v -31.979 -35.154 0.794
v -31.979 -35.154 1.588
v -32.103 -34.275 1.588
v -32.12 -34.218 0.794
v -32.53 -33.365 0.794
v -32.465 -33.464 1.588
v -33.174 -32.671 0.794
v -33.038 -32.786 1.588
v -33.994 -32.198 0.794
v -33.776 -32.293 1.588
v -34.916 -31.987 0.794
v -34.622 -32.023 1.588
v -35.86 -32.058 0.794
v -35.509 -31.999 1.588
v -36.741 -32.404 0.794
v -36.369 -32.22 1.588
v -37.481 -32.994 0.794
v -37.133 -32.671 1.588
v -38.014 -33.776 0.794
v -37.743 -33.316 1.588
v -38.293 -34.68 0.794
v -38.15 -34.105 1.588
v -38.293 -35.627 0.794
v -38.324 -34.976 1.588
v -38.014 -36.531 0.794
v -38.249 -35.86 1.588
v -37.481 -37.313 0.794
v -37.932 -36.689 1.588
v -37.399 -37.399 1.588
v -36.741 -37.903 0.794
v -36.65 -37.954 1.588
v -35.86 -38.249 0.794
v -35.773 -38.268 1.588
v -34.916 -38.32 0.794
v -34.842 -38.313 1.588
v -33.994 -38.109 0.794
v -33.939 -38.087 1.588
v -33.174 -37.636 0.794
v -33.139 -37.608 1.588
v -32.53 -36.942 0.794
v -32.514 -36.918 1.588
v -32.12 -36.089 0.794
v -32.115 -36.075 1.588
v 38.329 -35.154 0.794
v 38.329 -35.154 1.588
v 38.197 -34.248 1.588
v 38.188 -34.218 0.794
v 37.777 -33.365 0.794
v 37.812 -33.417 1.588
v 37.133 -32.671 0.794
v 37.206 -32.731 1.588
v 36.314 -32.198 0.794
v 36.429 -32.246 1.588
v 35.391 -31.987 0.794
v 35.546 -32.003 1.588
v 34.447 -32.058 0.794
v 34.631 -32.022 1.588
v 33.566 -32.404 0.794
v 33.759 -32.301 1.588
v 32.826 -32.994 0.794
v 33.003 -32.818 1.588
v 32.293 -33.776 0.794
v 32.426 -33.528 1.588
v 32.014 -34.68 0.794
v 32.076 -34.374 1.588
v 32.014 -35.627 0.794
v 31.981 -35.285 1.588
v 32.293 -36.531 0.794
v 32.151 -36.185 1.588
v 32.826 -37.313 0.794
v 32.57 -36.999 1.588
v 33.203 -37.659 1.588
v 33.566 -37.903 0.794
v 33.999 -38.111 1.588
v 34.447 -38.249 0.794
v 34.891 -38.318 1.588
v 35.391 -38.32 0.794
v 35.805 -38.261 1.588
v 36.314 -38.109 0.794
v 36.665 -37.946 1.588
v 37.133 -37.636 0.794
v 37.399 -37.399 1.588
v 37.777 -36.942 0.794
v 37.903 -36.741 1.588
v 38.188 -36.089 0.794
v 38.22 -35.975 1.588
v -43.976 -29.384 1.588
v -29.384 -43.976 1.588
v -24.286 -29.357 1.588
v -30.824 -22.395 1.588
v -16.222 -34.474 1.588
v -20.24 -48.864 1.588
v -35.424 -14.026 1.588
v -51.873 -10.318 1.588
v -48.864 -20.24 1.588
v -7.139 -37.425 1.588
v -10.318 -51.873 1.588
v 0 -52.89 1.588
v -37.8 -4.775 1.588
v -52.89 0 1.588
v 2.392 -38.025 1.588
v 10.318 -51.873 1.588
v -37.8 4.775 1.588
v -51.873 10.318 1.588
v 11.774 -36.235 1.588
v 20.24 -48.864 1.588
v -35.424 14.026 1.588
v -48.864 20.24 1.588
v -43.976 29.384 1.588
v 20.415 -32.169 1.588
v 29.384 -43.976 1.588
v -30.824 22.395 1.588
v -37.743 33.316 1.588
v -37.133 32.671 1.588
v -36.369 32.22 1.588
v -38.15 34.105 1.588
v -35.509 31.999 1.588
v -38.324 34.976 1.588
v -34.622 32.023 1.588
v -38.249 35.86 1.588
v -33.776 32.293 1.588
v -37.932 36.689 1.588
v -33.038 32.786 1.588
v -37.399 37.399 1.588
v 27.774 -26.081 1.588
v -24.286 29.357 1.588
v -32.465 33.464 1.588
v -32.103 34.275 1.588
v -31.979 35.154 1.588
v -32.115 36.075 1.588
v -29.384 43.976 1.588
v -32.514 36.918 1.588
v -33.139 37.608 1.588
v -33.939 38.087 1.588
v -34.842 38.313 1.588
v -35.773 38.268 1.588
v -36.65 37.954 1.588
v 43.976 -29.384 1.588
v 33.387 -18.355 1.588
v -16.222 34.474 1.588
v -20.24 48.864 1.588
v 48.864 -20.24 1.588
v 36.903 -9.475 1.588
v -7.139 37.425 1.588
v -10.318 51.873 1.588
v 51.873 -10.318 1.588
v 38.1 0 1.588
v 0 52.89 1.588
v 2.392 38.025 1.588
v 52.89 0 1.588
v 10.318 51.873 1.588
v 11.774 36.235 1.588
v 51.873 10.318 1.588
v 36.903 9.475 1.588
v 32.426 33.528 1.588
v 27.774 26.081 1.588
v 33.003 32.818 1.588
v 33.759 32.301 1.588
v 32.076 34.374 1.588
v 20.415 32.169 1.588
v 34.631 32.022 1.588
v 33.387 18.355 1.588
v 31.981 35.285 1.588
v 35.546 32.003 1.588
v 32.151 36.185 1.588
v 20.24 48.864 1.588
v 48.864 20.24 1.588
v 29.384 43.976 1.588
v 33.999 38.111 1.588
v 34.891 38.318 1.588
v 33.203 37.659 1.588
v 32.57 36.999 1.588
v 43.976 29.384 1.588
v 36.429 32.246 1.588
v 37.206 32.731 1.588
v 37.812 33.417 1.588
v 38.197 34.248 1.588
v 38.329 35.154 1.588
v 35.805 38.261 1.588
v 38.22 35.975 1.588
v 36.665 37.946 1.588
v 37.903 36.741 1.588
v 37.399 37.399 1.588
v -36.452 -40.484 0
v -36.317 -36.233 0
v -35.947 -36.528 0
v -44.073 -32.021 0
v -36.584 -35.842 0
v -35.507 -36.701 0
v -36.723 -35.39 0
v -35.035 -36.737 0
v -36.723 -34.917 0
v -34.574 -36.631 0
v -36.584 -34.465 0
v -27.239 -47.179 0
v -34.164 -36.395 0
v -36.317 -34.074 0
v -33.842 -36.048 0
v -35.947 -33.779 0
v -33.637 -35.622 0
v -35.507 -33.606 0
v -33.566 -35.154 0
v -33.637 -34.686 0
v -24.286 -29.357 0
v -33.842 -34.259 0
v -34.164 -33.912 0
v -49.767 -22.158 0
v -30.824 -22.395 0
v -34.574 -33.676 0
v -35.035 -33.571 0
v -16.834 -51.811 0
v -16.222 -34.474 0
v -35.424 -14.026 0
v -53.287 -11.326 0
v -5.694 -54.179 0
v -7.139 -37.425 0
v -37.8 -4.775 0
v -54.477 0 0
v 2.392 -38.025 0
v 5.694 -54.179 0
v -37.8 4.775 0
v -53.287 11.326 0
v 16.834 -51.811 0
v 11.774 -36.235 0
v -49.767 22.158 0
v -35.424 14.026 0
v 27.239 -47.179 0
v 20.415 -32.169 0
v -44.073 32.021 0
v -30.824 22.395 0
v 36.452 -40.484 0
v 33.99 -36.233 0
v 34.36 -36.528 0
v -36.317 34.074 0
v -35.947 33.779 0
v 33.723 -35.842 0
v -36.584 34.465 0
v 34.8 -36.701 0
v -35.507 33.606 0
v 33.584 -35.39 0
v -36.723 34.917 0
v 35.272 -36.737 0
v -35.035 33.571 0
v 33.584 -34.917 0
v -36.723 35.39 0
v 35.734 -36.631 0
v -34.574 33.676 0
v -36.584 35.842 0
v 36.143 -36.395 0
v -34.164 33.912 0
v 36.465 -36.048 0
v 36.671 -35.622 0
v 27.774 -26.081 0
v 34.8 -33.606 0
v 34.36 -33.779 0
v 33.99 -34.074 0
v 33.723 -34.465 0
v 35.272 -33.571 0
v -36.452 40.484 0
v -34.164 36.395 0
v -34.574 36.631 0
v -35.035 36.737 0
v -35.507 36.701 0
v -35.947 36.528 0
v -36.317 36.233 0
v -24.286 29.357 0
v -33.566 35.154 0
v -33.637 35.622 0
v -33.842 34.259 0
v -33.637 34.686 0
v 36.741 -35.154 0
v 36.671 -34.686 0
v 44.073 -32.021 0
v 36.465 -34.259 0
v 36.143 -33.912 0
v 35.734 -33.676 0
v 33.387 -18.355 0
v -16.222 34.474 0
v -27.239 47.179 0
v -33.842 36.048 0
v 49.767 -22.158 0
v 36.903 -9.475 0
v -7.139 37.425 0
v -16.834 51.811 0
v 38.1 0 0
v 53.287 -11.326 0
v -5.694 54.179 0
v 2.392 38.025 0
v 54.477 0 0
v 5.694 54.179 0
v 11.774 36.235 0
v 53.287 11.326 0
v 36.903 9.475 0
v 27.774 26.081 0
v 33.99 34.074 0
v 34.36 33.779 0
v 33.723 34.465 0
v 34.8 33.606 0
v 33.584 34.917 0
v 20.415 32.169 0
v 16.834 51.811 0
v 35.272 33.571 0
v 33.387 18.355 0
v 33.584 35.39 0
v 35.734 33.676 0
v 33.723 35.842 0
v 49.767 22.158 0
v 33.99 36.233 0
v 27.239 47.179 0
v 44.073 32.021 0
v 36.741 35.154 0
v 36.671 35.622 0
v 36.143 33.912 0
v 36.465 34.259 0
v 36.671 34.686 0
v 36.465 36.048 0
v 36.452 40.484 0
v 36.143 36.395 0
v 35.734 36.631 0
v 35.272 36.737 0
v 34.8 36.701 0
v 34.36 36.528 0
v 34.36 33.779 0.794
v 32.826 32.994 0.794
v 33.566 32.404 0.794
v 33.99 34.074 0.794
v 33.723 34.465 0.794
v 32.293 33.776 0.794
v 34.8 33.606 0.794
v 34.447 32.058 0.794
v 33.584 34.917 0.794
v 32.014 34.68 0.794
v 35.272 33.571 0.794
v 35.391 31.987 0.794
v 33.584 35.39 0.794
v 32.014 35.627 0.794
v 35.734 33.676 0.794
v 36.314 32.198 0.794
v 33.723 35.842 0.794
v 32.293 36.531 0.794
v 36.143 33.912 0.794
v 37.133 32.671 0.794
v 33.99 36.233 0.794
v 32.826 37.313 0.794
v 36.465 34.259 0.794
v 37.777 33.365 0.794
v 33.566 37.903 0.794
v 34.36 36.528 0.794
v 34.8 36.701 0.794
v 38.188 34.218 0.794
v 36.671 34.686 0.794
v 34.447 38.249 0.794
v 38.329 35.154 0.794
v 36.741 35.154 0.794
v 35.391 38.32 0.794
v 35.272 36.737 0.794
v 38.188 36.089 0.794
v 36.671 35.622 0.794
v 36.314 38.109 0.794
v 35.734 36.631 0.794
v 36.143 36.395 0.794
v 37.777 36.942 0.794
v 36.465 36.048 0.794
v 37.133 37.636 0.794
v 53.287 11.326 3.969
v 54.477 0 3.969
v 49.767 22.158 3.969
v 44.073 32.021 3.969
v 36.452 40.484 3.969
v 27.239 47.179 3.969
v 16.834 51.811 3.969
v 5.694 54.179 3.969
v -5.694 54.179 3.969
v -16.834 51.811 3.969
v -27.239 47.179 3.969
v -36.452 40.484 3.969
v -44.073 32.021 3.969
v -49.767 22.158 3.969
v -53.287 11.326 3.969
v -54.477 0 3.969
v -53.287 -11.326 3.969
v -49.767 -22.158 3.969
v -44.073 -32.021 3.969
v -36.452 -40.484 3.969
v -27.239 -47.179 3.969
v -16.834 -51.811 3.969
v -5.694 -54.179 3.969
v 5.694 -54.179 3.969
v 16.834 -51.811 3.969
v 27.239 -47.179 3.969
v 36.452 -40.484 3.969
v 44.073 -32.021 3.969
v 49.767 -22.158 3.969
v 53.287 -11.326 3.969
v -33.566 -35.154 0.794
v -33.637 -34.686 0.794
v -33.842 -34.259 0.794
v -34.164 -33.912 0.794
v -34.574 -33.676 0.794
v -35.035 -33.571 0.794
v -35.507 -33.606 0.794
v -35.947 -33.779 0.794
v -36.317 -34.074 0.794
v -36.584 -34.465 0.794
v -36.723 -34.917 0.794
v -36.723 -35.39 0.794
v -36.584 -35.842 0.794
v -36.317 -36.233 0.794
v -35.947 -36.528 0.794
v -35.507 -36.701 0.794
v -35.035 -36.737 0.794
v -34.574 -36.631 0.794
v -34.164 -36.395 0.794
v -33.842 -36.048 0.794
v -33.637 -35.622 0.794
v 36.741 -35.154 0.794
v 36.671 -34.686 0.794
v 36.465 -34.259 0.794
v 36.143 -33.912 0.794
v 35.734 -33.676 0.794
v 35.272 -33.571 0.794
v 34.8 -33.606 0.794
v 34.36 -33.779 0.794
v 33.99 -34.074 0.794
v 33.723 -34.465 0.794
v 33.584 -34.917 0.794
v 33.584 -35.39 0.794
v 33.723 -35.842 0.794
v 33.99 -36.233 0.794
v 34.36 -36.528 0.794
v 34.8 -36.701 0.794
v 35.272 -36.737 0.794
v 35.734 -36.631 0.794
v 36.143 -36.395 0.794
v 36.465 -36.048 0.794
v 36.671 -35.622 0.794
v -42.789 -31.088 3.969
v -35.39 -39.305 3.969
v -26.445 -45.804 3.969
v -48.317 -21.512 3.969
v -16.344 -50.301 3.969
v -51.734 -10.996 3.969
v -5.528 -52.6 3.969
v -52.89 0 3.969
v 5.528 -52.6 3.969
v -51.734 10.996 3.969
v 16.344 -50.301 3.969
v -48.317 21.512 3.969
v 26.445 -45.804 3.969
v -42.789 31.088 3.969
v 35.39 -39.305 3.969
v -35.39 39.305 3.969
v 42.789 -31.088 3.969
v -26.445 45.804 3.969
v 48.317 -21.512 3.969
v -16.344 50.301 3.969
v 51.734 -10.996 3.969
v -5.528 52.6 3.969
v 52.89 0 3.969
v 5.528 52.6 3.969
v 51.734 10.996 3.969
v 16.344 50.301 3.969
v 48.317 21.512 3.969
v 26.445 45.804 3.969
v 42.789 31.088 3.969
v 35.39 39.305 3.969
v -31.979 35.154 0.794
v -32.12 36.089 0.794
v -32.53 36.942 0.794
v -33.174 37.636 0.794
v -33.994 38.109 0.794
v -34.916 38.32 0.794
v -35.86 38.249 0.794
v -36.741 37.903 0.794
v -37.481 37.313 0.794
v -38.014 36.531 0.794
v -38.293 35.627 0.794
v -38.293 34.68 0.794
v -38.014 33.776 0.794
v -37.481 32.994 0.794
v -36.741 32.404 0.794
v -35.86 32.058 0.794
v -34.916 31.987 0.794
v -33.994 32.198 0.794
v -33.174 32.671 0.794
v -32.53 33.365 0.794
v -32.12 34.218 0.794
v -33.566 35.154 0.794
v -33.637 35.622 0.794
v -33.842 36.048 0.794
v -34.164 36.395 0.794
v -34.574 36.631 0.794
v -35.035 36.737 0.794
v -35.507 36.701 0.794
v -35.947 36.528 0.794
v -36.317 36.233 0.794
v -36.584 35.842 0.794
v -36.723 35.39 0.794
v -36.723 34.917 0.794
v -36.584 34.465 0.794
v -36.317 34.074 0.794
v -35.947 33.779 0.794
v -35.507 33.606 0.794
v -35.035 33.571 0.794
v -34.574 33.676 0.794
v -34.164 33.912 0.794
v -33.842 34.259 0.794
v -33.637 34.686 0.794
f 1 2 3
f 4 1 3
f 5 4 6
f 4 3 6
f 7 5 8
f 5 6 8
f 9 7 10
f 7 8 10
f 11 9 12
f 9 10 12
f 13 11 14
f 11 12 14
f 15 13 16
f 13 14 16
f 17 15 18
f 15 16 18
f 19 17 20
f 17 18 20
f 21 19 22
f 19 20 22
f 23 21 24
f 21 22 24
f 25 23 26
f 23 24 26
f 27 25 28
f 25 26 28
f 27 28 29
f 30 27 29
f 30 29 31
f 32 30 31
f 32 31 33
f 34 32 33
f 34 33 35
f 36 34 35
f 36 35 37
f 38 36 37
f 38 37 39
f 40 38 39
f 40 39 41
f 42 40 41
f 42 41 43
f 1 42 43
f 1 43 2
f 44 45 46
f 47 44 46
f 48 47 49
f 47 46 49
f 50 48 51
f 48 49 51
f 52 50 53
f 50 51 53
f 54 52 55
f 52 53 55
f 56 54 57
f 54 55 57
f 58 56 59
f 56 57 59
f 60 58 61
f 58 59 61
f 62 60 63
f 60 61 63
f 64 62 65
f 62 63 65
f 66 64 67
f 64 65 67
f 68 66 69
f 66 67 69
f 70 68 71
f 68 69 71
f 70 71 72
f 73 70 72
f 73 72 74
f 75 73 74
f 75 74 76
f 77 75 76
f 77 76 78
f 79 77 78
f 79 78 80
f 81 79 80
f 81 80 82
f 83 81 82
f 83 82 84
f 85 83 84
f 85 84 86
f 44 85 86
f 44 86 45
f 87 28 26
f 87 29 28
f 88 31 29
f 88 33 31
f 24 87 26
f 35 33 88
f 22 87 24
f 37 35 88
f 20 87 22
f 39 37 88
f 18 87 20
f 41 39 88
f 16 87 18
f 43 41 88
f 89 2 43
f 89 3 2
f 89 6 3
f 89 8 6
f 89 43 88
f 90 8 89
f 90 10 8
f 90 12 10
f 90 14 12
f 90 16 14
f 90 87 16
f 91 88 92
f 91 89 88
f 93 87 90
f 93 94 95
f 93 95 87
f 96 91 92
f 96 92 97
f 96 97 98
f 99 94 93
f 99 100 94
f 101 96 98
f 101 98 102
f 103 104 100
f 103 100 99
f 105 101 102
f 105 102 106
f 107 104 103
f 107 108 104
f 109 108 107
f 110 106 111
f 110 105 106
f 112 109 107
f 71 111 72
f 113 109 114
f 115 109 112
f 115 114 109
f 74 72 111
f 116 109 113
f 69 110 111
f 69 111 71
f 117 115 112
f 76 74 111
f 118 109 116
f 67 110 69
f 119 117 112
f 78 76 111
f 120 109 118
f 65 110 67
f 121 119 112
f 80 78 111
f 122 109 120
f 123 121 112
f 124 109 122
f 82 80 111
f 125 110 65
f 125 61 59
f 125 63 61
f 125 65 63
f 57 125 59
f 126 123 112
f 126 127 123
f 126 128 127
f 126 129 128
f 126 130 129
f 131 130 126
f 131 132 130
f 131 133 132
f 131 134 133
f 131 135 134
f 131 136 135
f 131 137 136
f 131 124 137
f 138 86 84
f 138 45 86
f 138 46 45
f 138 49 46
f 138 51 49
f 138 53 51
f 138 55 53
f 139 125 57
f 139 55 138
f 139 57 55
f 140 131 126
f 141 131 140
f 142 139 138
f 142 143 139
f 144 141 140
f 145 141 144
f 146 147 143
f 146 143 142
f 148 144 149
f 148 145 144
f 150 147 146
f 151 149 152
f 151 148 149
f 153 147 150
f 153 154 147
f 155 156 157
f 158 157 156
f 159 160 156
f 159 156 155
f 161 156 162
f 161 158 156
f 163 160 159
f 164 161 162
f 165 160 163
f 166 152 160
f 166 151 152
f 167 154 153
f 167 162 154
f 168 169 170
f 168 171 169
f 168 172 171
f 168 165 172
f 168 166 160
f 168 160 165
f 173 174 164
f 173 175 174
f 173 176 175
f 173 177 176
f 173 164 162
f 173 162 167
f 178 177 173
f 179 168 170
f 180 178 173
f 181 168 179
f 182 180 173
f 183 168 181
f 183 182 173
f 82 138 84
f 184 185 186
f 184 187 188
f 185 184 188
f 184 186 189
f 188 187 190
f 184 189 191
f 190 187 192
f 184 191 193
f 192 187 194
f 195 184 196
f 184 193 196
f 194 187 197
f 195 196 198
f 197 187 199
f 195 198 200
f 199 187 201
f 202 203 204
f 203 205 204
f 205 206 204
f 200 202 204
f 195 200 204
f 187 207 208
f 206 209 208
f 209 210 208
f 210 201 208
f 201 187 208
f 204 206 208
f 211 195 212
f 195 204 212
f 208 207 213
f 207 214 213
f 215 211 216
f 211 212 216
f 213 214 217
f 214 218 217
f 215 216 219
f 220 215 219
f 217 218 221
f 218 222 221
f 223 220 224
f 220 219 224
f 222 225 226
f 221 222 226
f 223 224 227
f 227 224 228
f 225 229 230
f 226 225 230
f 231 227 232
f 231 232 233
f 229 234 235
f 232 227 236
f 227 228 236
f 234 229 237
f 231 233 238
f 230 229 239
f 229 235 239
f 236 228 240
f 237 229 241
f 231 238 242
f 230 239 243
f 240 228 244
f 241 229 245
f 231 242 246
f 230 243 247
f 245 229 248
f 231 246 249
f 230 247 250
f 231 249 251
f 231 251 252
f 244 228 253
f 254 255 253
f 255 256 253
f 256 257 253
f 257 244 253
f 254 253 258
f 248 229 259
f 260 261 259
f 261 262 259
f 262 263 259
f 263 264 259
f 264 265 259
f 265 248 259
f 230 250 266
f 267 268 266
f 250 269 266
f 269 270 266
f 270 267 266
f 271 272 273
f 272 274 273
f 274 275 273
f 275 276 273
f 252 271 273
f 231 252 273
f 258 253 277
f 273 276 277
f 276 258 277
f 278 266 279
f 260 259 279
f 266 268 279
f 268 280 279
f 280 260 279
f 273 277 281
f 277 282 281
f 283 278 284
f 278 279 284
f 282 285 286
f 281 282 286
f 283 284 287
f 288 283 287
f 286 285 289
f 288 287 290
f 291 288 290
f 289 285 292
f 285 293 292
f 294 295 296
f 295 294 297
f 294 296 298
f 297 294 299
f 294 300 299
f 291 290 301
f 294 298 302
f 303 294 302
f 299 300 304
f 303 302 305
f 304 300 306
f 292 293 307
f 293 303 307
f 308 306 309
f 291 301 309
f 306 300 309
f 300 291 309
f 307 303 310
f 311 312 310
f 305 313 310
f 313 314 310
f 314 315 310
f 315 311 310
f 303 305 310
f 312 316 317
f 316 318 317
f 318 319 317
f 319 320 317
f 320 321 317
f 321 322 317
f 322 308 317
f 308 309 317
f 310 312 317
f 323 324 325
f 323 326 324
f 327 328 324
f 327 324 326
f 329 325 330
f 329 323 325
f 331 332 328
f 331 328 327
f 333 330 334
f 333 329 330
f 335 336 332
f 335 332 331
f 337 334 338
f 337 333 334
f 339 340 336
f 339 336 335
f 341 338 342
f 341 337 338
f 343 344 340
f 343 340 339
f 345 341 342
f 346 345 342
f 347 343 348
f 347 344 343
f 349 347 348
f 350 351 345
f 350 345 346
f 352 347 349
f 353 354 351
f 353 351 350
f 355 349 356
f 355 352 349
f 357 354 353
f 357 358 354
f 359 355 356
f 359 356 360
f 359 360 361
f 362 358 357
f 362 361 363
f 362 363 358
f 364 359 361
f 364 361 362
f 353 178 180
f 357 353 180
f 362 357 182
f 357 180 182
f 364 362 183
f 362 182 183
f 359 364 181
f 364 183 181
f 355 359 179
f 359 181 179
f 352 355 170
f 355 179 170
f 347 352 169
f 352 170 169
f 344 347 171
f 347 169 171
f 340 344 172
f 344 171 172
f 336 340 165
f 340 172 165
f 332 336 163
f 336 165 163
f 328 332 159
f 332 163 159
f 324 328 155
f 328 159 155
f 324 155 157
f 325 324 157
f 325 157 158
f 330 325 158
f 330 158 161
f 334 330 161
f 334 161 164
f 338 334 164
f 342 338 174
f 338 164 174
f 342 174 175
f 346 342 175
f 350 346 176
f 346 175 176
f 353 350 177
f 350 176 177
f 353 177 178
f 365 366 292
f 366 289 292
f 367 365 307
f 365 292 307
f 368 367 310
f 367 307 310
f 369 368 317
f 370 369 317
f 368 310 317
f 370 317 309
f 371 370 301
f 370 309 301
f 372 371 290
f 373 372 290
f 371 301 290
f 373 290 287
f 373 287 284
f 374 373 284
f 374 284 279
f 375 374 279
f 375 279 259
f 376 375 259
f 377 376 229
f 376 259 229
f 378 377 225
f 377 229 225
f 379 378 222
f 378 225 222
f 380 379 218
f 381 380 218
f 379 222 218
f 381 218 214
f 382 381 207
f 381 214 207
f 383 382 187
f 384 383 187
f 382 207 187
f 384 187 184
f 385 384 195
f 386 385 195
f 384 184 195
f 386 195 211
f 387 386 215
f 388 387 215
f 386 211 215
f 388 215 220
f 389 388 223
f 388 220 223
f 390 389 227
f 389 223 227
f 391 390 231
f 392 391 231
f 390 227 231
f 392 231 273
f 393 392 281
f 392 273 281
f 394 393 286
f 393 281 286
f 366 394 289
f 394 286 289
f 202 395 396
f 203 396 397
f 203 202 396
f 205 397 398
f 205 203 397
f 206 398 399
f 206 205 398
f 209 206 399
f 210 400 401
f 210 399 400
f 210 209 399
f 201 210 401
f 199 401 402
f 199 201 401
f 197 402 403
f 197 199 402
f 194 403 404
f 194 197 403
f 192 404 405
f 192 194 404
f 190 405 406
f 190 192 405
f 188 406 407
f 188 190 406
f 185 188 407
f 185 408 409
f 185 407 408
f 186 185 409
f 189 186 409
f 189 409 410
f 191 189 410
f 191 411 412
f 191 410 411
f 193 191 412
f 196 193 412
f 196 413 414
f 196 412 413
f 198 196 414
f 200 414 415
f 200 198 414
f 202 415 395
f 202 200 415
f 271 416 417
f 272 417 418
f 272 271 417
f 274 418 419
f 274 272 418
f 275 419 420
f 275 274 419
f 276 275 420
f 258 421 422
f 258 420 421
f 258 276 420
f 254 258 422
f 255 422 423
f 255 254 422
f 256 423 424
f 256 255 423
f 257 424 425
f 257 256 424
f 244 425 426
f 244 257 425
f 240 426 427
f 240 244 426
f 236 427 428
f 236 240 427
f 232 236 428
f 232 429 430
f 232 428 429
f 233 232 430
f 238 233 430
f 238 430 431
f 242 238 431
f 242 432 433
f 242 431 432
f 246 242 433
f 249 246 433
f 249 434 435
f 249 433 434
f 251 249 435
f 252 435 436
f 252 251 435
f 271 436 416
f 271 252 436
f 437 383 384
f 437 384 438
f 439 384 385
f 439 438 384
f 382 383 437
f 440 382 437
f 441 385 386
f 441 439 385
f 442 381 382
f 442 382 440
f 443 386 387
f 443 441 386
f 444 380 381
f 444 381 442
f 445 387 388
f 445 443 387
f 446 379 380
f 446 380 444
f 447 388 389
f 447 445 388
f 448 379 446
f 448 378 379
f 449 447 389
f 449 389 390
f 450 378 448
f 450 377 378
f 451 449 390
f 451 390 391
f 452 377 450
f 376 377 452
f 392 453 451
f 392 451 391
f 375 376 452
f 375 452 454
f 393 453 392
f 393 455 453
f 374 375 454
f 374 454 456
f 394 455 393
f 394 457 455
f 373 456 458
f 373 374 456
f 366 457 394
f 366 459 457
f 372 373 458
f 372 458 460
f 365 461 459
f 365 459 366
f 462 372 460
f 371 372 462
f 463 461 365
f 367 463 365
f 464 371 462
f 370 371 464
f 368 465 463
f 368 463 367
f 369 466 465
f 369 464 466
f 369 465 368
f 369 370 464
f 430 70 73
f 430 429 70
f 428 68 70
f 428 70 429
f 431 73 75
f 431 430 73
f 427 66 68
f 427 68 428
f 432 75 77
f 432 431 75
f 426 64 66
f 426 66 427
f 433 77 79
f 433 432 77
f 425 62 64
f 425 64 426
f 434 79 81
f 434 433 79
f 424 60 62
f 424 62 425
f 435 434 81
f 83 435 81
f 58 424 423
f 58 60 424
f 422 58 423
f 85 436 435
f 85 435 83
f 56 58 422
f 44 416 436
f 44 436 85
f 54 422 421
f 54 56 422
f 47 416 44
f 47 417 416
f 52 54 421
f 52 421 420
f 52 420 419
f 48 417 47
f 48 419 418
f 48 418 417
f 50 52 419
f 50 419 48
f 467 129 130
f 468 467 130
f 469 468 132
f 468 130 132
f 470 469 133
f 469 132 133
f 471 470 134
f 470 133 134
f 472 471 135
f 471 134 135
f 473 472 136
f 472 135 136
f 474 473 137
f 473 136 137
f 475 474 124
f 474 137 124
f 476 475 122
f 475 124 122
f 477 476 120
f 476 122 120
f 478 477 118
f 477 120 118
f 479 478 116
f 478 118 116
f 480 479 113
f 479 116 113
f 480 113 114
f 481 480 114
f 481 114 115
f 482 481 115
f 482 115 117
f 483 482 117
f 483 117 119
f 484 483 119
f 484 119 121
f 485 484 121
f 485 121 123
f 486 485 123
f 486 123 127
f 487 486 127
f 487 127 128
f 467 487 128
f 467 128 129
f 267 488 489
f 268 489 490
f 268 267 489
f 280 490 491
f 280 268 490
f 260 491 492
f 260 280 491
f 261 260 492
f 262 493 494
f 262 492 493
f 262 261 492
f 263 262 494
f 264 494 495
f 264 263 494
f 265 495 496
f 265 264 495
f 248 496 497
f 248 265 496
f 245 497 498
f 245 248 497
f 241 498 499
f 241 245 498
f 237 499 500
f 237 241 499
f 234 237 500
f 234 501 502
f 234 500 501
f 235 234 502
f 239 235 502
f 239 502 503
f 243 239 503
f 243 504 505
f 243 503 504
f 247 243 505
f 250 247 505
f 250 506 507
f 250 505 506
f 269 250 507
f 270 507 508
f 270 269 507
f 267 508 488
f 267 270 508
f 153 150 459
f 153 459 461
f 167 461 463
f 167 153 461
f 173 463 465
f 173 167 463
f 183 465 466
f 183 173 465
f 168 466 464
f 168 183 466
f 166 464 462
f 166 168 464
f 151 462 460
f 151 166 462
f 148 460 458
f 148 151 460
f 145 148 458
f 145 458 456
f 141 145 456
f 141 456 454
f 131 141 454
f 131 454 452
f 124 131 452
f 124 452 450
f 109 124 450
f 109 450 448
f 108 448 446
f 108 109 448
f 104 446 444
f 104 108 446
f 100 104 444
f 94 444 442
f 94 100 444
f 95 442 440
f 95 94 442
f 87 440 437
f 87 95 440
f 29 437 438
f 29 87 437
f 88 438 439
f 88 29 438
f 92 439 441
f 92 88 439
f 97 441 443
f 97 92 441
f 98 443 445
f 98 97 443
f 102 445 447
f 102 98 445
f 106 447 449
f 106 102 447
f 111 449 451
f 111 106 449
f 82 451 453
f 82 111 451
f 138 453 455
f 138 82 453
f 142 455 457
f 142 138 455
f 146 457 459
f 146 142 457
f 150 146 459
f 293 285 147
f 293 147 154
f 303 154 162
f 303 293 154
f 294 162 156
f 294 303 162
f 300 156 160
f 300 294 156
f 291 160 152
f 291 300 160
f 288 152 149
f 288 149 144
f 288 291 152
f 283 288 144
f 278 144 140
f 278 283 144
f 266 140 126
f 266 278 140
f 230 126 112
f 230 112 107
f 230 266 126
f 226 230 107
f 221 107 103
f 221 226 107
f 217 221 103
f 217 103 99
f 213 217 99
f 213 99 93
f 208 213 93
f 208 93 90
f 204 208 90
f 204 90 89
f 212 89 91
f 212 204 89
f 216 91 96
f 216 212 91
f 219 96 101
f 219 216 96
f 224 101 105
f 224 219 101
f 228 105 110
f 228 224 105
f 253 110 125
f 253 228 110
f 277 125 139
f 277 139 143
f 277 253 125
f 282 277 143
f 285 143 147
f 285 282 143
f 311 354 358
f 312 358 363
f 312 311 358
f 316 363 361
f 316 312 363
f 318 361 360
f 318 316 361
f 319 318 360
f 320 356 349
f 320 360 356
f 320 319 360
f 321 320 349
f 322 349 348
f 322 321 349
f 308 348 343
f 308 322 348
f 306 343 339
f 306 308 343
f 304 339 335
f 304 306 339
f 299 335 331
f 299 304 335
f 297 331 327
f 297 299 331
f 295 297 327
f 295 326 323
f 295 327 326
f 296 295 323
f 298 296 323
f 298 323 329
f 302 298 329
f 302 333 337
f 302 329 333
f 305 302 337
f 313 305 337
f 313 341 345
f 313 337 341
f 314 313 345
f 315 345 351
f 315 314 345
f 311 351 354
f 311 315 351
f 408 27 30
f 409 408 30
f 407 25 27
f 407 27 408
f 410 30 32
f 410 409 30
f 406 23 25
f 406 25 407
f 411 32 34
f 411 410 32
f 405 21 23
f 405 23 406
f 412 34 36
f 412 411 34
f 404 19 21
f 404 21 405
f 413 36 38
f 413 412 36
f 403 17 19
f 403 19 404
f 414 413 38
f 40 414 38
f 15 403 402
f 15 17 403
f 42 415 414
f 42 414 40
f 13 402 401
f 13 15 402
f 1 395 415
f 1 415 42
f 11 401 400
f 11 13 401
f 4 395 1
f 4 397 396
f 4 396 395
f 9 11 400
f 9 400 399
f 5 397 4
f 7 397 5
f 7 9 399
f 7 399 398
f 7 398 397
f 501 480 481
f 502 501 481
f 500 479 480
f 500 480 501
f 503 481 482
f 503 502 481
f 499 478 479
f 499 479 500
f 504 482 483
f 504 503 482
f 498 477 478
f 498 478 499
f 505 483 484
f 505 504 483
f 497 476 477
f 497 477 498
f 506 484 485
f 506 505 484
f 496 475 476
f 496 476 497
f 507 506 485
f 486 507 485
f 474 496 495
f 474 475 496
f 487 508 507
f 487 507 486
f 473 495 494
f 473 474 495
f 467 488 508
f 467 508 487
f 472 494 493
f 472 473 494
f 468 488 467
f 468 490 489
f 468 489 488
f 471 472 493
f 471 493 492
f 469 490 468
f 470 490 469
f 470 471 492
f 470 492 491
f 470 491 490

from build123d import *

# Parameters (mm, degrees)
F0_R     = 54.477198
F0_R_2   = 1.5875
F0_R_3   = 38.1
F1_DEPTH = 1.5875
F2_R     = 54.477198
F2_R_2   = 52.889698
F3_DEPTH = 2.38125
F4_R     = 3.175
F5_DEPTH = 0.79375


with BuildPart() as f1:
    # F0 (on Top) → F1 (new body)
    with BuildSketch(Plane.XY):
        Circle(F0_R)
        with Locations((-35.1536, -35.1536)):
            Circle(F0_R_2, mode=Mode.SUBTRACT)
        with Locations((35.1536, -35.1536)):
            Circle(F0_R_2, mode=Mode.SUBTRACT)
        with Locations((-35.1536, 35.1536)):
            Circle(F0_R_2, mode=Mode.SUBTRACT)
        Circle(F0_R_3, mode=Mode.SUBTRACT)
        with Locations((35.1536, 35.1536)):
            Circle(F0_R_2, mode=Mode.SUBTRACT)
    extrude(amount=F1_DEPTH)

    # F2 (on face) → F3 (join)
    with BuildSketch(Plane.XY.offset(1.5875)):
        Circle(F2_R)
        Circle(F2_R_2, mode=Mode.SUBTRACT)
    extrude(amount=F3_DEPTH)

    # F4 (on face) → F5 (cut)
    with BuildSketch(Plane.XY.offset(1.5875)):
        with Locations((-35.1536, 35.1536)):
            Circle(F4_R)
        with Locations((35.1536, 35.1536)):
            Circle(F4_R)
        with Locations((35.1536, -35.1536)):
            Circle(F4_R)
        with Locations((-35.1536, -35.1536)):
            Circle(F4_R)
    extrude(amount=-F5_DEPTH, mode=Mode.SUBTRACT)


solid = f1.part
